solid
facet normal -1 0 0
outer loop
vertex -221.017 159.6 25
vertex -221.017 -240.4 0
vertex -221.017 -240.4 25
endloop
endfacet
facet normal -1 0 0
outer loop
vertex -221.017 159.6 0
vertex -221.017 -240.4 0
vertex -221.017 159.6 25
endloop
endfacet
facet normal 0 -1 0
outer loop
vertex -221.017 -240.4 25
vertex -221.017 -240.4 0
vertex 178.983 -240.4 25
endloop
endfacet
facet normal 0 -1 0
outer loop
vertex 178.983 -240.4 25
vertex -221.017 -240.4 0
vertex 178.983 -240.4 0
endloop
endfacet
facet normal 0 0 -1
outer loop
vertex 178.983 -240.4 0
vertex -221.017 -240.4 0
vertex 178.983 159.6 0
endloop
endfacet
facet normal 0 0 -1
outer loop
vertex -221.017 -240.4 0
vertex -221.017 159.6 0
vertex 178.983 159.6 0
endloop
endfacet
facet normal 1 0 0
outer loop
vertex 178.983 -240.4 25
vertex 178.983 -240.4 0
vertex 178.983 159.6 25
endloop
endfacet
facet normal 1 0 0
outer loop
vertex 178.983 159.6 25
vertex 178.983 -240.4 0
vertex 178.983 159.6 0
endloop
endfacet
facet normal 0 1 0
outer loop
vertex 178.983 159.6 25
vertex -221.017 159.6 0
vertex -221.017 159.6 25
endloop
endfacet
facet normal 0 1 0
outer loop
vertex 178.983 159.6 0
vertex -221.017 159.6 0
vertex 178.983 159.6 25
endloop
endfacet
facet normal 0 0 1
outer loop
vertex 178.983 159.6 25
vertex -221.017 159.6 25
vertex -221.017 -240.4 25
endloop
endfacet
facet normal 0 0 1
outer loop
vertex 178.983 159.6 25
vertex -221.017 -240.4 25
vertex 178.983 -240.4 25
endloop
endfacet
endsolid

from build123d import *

# Parameters (mm, degrees)
ESBO_O1_W                = 400
ESBO_O1_H                = 400
RESSALTO_EXTRUS_O1_DEPTH = 25
ESBO_O2_W                = 50
ESBO_O2_H                = 50
RESSALTO_EXTRUS_O3_DEPTH = 30
ESBO_O3_W                = 400
ESBO_O3_H                = 5
CORTE_EXTRUS_O1_DEPTH    = 458.682719878


with BuildPart() as part:
    # Esboço1 → Ressalto-extrusão1 (new body)
    with BuildSketch(Plane.XY):
        with Locations((-21.016904501, -40.4)):
            Rectangle(ESBO_O1_W, ESBO_O1_H)
    extrude(amount=RESSALTO_EXTRUS_O1_DEPTH)

    # Esboço2 → Ressalto-extrusão3 (add)
    with BuildSketch(Plane.XY.offset(25)):
        with Locations((-196.016904501, 134.6)):
            Rectangle(ESBO_O2_W, ESBO_O2_H)
        with Locations((-96.016904501, 34.6)):
            Rectangle(ESBO_O2_W, ESBO_O2_H)
        with Locations((3.983095499, -65.4)):
            Rectangle(ESBO_O2_W, ESBO_O2_H)
        with Locations((104.55184435, -165.4)):
            Rectangle(ESBO_O2_W, ESBO_O2_H)
        with Locations((-196.016904501, -165.4)):
            Rectangle(ESBO_O2_W, ESBO_O2_H)
        with Locations((-196.016904501, -65.4)):
            Rectangle(ESBO_O2_W, ESBO_O2_H)
        with Locations((-96.016904501, -215.4)):
            Rectangle(ESBO_O2_W, ESBO_O2_H)
        with Locations((3.983095499, -215.4)):
            Rectangle(ESBO_O2_W, ESBO_O2_H)
        with Locations((-97.204301074, 134.6)):
            Rectangle(ESBO_O2_W, ESBO_O2_H)
        with Locations((4.217571053, 134.6)):
            Rectangle(ESBO_O2_W, ESBO_O2_H)
        with Locations((-96.016904501, -65.4)):
            Rectangle(ESBO_O2_W, ESBO_O2_H)
        with Locations((153.983095499, 34.6)):
            Rectangle(ESBO_O2_W, ESBO_O2_H)
        with Locations((153.983095499, -65.4)):
            Rectangle(ESBO_O2_W, ESBO_O2_H)
        with Locations((53.983095499, 34.6)):
            Rectangle(ESBO_O2_W, ESBO_O2_H)
        with Locations((-196.016904501, 34.6)):
            Rectangle(ESBO_O2_W, ESBO_O2_H)
        with Locations((103.983095499, 134.6)):
            Rectangle(ESBO_O2_W, ESBO_O2_H)
    extrude(amount=-RESSALTO_EXTRUS_O3_DEPTH)

    # Esboço3 → Corte-extrusão1 (cut, through all)
    with BuildSketch(Plane(origin=(0, 159.6, 0), x_dir=(1, 0, 0), z_dir=(0, 1, 0))):
        with Locations((-21.016904501, 2.5)):
            Rectangle(ESBO_O3_W, ESBO_O3_H)
    extrude(amount=-CORTE_EXTRUS_O1_DEPTH, mode=Mode.SUBTRACT)


solid = part.part
